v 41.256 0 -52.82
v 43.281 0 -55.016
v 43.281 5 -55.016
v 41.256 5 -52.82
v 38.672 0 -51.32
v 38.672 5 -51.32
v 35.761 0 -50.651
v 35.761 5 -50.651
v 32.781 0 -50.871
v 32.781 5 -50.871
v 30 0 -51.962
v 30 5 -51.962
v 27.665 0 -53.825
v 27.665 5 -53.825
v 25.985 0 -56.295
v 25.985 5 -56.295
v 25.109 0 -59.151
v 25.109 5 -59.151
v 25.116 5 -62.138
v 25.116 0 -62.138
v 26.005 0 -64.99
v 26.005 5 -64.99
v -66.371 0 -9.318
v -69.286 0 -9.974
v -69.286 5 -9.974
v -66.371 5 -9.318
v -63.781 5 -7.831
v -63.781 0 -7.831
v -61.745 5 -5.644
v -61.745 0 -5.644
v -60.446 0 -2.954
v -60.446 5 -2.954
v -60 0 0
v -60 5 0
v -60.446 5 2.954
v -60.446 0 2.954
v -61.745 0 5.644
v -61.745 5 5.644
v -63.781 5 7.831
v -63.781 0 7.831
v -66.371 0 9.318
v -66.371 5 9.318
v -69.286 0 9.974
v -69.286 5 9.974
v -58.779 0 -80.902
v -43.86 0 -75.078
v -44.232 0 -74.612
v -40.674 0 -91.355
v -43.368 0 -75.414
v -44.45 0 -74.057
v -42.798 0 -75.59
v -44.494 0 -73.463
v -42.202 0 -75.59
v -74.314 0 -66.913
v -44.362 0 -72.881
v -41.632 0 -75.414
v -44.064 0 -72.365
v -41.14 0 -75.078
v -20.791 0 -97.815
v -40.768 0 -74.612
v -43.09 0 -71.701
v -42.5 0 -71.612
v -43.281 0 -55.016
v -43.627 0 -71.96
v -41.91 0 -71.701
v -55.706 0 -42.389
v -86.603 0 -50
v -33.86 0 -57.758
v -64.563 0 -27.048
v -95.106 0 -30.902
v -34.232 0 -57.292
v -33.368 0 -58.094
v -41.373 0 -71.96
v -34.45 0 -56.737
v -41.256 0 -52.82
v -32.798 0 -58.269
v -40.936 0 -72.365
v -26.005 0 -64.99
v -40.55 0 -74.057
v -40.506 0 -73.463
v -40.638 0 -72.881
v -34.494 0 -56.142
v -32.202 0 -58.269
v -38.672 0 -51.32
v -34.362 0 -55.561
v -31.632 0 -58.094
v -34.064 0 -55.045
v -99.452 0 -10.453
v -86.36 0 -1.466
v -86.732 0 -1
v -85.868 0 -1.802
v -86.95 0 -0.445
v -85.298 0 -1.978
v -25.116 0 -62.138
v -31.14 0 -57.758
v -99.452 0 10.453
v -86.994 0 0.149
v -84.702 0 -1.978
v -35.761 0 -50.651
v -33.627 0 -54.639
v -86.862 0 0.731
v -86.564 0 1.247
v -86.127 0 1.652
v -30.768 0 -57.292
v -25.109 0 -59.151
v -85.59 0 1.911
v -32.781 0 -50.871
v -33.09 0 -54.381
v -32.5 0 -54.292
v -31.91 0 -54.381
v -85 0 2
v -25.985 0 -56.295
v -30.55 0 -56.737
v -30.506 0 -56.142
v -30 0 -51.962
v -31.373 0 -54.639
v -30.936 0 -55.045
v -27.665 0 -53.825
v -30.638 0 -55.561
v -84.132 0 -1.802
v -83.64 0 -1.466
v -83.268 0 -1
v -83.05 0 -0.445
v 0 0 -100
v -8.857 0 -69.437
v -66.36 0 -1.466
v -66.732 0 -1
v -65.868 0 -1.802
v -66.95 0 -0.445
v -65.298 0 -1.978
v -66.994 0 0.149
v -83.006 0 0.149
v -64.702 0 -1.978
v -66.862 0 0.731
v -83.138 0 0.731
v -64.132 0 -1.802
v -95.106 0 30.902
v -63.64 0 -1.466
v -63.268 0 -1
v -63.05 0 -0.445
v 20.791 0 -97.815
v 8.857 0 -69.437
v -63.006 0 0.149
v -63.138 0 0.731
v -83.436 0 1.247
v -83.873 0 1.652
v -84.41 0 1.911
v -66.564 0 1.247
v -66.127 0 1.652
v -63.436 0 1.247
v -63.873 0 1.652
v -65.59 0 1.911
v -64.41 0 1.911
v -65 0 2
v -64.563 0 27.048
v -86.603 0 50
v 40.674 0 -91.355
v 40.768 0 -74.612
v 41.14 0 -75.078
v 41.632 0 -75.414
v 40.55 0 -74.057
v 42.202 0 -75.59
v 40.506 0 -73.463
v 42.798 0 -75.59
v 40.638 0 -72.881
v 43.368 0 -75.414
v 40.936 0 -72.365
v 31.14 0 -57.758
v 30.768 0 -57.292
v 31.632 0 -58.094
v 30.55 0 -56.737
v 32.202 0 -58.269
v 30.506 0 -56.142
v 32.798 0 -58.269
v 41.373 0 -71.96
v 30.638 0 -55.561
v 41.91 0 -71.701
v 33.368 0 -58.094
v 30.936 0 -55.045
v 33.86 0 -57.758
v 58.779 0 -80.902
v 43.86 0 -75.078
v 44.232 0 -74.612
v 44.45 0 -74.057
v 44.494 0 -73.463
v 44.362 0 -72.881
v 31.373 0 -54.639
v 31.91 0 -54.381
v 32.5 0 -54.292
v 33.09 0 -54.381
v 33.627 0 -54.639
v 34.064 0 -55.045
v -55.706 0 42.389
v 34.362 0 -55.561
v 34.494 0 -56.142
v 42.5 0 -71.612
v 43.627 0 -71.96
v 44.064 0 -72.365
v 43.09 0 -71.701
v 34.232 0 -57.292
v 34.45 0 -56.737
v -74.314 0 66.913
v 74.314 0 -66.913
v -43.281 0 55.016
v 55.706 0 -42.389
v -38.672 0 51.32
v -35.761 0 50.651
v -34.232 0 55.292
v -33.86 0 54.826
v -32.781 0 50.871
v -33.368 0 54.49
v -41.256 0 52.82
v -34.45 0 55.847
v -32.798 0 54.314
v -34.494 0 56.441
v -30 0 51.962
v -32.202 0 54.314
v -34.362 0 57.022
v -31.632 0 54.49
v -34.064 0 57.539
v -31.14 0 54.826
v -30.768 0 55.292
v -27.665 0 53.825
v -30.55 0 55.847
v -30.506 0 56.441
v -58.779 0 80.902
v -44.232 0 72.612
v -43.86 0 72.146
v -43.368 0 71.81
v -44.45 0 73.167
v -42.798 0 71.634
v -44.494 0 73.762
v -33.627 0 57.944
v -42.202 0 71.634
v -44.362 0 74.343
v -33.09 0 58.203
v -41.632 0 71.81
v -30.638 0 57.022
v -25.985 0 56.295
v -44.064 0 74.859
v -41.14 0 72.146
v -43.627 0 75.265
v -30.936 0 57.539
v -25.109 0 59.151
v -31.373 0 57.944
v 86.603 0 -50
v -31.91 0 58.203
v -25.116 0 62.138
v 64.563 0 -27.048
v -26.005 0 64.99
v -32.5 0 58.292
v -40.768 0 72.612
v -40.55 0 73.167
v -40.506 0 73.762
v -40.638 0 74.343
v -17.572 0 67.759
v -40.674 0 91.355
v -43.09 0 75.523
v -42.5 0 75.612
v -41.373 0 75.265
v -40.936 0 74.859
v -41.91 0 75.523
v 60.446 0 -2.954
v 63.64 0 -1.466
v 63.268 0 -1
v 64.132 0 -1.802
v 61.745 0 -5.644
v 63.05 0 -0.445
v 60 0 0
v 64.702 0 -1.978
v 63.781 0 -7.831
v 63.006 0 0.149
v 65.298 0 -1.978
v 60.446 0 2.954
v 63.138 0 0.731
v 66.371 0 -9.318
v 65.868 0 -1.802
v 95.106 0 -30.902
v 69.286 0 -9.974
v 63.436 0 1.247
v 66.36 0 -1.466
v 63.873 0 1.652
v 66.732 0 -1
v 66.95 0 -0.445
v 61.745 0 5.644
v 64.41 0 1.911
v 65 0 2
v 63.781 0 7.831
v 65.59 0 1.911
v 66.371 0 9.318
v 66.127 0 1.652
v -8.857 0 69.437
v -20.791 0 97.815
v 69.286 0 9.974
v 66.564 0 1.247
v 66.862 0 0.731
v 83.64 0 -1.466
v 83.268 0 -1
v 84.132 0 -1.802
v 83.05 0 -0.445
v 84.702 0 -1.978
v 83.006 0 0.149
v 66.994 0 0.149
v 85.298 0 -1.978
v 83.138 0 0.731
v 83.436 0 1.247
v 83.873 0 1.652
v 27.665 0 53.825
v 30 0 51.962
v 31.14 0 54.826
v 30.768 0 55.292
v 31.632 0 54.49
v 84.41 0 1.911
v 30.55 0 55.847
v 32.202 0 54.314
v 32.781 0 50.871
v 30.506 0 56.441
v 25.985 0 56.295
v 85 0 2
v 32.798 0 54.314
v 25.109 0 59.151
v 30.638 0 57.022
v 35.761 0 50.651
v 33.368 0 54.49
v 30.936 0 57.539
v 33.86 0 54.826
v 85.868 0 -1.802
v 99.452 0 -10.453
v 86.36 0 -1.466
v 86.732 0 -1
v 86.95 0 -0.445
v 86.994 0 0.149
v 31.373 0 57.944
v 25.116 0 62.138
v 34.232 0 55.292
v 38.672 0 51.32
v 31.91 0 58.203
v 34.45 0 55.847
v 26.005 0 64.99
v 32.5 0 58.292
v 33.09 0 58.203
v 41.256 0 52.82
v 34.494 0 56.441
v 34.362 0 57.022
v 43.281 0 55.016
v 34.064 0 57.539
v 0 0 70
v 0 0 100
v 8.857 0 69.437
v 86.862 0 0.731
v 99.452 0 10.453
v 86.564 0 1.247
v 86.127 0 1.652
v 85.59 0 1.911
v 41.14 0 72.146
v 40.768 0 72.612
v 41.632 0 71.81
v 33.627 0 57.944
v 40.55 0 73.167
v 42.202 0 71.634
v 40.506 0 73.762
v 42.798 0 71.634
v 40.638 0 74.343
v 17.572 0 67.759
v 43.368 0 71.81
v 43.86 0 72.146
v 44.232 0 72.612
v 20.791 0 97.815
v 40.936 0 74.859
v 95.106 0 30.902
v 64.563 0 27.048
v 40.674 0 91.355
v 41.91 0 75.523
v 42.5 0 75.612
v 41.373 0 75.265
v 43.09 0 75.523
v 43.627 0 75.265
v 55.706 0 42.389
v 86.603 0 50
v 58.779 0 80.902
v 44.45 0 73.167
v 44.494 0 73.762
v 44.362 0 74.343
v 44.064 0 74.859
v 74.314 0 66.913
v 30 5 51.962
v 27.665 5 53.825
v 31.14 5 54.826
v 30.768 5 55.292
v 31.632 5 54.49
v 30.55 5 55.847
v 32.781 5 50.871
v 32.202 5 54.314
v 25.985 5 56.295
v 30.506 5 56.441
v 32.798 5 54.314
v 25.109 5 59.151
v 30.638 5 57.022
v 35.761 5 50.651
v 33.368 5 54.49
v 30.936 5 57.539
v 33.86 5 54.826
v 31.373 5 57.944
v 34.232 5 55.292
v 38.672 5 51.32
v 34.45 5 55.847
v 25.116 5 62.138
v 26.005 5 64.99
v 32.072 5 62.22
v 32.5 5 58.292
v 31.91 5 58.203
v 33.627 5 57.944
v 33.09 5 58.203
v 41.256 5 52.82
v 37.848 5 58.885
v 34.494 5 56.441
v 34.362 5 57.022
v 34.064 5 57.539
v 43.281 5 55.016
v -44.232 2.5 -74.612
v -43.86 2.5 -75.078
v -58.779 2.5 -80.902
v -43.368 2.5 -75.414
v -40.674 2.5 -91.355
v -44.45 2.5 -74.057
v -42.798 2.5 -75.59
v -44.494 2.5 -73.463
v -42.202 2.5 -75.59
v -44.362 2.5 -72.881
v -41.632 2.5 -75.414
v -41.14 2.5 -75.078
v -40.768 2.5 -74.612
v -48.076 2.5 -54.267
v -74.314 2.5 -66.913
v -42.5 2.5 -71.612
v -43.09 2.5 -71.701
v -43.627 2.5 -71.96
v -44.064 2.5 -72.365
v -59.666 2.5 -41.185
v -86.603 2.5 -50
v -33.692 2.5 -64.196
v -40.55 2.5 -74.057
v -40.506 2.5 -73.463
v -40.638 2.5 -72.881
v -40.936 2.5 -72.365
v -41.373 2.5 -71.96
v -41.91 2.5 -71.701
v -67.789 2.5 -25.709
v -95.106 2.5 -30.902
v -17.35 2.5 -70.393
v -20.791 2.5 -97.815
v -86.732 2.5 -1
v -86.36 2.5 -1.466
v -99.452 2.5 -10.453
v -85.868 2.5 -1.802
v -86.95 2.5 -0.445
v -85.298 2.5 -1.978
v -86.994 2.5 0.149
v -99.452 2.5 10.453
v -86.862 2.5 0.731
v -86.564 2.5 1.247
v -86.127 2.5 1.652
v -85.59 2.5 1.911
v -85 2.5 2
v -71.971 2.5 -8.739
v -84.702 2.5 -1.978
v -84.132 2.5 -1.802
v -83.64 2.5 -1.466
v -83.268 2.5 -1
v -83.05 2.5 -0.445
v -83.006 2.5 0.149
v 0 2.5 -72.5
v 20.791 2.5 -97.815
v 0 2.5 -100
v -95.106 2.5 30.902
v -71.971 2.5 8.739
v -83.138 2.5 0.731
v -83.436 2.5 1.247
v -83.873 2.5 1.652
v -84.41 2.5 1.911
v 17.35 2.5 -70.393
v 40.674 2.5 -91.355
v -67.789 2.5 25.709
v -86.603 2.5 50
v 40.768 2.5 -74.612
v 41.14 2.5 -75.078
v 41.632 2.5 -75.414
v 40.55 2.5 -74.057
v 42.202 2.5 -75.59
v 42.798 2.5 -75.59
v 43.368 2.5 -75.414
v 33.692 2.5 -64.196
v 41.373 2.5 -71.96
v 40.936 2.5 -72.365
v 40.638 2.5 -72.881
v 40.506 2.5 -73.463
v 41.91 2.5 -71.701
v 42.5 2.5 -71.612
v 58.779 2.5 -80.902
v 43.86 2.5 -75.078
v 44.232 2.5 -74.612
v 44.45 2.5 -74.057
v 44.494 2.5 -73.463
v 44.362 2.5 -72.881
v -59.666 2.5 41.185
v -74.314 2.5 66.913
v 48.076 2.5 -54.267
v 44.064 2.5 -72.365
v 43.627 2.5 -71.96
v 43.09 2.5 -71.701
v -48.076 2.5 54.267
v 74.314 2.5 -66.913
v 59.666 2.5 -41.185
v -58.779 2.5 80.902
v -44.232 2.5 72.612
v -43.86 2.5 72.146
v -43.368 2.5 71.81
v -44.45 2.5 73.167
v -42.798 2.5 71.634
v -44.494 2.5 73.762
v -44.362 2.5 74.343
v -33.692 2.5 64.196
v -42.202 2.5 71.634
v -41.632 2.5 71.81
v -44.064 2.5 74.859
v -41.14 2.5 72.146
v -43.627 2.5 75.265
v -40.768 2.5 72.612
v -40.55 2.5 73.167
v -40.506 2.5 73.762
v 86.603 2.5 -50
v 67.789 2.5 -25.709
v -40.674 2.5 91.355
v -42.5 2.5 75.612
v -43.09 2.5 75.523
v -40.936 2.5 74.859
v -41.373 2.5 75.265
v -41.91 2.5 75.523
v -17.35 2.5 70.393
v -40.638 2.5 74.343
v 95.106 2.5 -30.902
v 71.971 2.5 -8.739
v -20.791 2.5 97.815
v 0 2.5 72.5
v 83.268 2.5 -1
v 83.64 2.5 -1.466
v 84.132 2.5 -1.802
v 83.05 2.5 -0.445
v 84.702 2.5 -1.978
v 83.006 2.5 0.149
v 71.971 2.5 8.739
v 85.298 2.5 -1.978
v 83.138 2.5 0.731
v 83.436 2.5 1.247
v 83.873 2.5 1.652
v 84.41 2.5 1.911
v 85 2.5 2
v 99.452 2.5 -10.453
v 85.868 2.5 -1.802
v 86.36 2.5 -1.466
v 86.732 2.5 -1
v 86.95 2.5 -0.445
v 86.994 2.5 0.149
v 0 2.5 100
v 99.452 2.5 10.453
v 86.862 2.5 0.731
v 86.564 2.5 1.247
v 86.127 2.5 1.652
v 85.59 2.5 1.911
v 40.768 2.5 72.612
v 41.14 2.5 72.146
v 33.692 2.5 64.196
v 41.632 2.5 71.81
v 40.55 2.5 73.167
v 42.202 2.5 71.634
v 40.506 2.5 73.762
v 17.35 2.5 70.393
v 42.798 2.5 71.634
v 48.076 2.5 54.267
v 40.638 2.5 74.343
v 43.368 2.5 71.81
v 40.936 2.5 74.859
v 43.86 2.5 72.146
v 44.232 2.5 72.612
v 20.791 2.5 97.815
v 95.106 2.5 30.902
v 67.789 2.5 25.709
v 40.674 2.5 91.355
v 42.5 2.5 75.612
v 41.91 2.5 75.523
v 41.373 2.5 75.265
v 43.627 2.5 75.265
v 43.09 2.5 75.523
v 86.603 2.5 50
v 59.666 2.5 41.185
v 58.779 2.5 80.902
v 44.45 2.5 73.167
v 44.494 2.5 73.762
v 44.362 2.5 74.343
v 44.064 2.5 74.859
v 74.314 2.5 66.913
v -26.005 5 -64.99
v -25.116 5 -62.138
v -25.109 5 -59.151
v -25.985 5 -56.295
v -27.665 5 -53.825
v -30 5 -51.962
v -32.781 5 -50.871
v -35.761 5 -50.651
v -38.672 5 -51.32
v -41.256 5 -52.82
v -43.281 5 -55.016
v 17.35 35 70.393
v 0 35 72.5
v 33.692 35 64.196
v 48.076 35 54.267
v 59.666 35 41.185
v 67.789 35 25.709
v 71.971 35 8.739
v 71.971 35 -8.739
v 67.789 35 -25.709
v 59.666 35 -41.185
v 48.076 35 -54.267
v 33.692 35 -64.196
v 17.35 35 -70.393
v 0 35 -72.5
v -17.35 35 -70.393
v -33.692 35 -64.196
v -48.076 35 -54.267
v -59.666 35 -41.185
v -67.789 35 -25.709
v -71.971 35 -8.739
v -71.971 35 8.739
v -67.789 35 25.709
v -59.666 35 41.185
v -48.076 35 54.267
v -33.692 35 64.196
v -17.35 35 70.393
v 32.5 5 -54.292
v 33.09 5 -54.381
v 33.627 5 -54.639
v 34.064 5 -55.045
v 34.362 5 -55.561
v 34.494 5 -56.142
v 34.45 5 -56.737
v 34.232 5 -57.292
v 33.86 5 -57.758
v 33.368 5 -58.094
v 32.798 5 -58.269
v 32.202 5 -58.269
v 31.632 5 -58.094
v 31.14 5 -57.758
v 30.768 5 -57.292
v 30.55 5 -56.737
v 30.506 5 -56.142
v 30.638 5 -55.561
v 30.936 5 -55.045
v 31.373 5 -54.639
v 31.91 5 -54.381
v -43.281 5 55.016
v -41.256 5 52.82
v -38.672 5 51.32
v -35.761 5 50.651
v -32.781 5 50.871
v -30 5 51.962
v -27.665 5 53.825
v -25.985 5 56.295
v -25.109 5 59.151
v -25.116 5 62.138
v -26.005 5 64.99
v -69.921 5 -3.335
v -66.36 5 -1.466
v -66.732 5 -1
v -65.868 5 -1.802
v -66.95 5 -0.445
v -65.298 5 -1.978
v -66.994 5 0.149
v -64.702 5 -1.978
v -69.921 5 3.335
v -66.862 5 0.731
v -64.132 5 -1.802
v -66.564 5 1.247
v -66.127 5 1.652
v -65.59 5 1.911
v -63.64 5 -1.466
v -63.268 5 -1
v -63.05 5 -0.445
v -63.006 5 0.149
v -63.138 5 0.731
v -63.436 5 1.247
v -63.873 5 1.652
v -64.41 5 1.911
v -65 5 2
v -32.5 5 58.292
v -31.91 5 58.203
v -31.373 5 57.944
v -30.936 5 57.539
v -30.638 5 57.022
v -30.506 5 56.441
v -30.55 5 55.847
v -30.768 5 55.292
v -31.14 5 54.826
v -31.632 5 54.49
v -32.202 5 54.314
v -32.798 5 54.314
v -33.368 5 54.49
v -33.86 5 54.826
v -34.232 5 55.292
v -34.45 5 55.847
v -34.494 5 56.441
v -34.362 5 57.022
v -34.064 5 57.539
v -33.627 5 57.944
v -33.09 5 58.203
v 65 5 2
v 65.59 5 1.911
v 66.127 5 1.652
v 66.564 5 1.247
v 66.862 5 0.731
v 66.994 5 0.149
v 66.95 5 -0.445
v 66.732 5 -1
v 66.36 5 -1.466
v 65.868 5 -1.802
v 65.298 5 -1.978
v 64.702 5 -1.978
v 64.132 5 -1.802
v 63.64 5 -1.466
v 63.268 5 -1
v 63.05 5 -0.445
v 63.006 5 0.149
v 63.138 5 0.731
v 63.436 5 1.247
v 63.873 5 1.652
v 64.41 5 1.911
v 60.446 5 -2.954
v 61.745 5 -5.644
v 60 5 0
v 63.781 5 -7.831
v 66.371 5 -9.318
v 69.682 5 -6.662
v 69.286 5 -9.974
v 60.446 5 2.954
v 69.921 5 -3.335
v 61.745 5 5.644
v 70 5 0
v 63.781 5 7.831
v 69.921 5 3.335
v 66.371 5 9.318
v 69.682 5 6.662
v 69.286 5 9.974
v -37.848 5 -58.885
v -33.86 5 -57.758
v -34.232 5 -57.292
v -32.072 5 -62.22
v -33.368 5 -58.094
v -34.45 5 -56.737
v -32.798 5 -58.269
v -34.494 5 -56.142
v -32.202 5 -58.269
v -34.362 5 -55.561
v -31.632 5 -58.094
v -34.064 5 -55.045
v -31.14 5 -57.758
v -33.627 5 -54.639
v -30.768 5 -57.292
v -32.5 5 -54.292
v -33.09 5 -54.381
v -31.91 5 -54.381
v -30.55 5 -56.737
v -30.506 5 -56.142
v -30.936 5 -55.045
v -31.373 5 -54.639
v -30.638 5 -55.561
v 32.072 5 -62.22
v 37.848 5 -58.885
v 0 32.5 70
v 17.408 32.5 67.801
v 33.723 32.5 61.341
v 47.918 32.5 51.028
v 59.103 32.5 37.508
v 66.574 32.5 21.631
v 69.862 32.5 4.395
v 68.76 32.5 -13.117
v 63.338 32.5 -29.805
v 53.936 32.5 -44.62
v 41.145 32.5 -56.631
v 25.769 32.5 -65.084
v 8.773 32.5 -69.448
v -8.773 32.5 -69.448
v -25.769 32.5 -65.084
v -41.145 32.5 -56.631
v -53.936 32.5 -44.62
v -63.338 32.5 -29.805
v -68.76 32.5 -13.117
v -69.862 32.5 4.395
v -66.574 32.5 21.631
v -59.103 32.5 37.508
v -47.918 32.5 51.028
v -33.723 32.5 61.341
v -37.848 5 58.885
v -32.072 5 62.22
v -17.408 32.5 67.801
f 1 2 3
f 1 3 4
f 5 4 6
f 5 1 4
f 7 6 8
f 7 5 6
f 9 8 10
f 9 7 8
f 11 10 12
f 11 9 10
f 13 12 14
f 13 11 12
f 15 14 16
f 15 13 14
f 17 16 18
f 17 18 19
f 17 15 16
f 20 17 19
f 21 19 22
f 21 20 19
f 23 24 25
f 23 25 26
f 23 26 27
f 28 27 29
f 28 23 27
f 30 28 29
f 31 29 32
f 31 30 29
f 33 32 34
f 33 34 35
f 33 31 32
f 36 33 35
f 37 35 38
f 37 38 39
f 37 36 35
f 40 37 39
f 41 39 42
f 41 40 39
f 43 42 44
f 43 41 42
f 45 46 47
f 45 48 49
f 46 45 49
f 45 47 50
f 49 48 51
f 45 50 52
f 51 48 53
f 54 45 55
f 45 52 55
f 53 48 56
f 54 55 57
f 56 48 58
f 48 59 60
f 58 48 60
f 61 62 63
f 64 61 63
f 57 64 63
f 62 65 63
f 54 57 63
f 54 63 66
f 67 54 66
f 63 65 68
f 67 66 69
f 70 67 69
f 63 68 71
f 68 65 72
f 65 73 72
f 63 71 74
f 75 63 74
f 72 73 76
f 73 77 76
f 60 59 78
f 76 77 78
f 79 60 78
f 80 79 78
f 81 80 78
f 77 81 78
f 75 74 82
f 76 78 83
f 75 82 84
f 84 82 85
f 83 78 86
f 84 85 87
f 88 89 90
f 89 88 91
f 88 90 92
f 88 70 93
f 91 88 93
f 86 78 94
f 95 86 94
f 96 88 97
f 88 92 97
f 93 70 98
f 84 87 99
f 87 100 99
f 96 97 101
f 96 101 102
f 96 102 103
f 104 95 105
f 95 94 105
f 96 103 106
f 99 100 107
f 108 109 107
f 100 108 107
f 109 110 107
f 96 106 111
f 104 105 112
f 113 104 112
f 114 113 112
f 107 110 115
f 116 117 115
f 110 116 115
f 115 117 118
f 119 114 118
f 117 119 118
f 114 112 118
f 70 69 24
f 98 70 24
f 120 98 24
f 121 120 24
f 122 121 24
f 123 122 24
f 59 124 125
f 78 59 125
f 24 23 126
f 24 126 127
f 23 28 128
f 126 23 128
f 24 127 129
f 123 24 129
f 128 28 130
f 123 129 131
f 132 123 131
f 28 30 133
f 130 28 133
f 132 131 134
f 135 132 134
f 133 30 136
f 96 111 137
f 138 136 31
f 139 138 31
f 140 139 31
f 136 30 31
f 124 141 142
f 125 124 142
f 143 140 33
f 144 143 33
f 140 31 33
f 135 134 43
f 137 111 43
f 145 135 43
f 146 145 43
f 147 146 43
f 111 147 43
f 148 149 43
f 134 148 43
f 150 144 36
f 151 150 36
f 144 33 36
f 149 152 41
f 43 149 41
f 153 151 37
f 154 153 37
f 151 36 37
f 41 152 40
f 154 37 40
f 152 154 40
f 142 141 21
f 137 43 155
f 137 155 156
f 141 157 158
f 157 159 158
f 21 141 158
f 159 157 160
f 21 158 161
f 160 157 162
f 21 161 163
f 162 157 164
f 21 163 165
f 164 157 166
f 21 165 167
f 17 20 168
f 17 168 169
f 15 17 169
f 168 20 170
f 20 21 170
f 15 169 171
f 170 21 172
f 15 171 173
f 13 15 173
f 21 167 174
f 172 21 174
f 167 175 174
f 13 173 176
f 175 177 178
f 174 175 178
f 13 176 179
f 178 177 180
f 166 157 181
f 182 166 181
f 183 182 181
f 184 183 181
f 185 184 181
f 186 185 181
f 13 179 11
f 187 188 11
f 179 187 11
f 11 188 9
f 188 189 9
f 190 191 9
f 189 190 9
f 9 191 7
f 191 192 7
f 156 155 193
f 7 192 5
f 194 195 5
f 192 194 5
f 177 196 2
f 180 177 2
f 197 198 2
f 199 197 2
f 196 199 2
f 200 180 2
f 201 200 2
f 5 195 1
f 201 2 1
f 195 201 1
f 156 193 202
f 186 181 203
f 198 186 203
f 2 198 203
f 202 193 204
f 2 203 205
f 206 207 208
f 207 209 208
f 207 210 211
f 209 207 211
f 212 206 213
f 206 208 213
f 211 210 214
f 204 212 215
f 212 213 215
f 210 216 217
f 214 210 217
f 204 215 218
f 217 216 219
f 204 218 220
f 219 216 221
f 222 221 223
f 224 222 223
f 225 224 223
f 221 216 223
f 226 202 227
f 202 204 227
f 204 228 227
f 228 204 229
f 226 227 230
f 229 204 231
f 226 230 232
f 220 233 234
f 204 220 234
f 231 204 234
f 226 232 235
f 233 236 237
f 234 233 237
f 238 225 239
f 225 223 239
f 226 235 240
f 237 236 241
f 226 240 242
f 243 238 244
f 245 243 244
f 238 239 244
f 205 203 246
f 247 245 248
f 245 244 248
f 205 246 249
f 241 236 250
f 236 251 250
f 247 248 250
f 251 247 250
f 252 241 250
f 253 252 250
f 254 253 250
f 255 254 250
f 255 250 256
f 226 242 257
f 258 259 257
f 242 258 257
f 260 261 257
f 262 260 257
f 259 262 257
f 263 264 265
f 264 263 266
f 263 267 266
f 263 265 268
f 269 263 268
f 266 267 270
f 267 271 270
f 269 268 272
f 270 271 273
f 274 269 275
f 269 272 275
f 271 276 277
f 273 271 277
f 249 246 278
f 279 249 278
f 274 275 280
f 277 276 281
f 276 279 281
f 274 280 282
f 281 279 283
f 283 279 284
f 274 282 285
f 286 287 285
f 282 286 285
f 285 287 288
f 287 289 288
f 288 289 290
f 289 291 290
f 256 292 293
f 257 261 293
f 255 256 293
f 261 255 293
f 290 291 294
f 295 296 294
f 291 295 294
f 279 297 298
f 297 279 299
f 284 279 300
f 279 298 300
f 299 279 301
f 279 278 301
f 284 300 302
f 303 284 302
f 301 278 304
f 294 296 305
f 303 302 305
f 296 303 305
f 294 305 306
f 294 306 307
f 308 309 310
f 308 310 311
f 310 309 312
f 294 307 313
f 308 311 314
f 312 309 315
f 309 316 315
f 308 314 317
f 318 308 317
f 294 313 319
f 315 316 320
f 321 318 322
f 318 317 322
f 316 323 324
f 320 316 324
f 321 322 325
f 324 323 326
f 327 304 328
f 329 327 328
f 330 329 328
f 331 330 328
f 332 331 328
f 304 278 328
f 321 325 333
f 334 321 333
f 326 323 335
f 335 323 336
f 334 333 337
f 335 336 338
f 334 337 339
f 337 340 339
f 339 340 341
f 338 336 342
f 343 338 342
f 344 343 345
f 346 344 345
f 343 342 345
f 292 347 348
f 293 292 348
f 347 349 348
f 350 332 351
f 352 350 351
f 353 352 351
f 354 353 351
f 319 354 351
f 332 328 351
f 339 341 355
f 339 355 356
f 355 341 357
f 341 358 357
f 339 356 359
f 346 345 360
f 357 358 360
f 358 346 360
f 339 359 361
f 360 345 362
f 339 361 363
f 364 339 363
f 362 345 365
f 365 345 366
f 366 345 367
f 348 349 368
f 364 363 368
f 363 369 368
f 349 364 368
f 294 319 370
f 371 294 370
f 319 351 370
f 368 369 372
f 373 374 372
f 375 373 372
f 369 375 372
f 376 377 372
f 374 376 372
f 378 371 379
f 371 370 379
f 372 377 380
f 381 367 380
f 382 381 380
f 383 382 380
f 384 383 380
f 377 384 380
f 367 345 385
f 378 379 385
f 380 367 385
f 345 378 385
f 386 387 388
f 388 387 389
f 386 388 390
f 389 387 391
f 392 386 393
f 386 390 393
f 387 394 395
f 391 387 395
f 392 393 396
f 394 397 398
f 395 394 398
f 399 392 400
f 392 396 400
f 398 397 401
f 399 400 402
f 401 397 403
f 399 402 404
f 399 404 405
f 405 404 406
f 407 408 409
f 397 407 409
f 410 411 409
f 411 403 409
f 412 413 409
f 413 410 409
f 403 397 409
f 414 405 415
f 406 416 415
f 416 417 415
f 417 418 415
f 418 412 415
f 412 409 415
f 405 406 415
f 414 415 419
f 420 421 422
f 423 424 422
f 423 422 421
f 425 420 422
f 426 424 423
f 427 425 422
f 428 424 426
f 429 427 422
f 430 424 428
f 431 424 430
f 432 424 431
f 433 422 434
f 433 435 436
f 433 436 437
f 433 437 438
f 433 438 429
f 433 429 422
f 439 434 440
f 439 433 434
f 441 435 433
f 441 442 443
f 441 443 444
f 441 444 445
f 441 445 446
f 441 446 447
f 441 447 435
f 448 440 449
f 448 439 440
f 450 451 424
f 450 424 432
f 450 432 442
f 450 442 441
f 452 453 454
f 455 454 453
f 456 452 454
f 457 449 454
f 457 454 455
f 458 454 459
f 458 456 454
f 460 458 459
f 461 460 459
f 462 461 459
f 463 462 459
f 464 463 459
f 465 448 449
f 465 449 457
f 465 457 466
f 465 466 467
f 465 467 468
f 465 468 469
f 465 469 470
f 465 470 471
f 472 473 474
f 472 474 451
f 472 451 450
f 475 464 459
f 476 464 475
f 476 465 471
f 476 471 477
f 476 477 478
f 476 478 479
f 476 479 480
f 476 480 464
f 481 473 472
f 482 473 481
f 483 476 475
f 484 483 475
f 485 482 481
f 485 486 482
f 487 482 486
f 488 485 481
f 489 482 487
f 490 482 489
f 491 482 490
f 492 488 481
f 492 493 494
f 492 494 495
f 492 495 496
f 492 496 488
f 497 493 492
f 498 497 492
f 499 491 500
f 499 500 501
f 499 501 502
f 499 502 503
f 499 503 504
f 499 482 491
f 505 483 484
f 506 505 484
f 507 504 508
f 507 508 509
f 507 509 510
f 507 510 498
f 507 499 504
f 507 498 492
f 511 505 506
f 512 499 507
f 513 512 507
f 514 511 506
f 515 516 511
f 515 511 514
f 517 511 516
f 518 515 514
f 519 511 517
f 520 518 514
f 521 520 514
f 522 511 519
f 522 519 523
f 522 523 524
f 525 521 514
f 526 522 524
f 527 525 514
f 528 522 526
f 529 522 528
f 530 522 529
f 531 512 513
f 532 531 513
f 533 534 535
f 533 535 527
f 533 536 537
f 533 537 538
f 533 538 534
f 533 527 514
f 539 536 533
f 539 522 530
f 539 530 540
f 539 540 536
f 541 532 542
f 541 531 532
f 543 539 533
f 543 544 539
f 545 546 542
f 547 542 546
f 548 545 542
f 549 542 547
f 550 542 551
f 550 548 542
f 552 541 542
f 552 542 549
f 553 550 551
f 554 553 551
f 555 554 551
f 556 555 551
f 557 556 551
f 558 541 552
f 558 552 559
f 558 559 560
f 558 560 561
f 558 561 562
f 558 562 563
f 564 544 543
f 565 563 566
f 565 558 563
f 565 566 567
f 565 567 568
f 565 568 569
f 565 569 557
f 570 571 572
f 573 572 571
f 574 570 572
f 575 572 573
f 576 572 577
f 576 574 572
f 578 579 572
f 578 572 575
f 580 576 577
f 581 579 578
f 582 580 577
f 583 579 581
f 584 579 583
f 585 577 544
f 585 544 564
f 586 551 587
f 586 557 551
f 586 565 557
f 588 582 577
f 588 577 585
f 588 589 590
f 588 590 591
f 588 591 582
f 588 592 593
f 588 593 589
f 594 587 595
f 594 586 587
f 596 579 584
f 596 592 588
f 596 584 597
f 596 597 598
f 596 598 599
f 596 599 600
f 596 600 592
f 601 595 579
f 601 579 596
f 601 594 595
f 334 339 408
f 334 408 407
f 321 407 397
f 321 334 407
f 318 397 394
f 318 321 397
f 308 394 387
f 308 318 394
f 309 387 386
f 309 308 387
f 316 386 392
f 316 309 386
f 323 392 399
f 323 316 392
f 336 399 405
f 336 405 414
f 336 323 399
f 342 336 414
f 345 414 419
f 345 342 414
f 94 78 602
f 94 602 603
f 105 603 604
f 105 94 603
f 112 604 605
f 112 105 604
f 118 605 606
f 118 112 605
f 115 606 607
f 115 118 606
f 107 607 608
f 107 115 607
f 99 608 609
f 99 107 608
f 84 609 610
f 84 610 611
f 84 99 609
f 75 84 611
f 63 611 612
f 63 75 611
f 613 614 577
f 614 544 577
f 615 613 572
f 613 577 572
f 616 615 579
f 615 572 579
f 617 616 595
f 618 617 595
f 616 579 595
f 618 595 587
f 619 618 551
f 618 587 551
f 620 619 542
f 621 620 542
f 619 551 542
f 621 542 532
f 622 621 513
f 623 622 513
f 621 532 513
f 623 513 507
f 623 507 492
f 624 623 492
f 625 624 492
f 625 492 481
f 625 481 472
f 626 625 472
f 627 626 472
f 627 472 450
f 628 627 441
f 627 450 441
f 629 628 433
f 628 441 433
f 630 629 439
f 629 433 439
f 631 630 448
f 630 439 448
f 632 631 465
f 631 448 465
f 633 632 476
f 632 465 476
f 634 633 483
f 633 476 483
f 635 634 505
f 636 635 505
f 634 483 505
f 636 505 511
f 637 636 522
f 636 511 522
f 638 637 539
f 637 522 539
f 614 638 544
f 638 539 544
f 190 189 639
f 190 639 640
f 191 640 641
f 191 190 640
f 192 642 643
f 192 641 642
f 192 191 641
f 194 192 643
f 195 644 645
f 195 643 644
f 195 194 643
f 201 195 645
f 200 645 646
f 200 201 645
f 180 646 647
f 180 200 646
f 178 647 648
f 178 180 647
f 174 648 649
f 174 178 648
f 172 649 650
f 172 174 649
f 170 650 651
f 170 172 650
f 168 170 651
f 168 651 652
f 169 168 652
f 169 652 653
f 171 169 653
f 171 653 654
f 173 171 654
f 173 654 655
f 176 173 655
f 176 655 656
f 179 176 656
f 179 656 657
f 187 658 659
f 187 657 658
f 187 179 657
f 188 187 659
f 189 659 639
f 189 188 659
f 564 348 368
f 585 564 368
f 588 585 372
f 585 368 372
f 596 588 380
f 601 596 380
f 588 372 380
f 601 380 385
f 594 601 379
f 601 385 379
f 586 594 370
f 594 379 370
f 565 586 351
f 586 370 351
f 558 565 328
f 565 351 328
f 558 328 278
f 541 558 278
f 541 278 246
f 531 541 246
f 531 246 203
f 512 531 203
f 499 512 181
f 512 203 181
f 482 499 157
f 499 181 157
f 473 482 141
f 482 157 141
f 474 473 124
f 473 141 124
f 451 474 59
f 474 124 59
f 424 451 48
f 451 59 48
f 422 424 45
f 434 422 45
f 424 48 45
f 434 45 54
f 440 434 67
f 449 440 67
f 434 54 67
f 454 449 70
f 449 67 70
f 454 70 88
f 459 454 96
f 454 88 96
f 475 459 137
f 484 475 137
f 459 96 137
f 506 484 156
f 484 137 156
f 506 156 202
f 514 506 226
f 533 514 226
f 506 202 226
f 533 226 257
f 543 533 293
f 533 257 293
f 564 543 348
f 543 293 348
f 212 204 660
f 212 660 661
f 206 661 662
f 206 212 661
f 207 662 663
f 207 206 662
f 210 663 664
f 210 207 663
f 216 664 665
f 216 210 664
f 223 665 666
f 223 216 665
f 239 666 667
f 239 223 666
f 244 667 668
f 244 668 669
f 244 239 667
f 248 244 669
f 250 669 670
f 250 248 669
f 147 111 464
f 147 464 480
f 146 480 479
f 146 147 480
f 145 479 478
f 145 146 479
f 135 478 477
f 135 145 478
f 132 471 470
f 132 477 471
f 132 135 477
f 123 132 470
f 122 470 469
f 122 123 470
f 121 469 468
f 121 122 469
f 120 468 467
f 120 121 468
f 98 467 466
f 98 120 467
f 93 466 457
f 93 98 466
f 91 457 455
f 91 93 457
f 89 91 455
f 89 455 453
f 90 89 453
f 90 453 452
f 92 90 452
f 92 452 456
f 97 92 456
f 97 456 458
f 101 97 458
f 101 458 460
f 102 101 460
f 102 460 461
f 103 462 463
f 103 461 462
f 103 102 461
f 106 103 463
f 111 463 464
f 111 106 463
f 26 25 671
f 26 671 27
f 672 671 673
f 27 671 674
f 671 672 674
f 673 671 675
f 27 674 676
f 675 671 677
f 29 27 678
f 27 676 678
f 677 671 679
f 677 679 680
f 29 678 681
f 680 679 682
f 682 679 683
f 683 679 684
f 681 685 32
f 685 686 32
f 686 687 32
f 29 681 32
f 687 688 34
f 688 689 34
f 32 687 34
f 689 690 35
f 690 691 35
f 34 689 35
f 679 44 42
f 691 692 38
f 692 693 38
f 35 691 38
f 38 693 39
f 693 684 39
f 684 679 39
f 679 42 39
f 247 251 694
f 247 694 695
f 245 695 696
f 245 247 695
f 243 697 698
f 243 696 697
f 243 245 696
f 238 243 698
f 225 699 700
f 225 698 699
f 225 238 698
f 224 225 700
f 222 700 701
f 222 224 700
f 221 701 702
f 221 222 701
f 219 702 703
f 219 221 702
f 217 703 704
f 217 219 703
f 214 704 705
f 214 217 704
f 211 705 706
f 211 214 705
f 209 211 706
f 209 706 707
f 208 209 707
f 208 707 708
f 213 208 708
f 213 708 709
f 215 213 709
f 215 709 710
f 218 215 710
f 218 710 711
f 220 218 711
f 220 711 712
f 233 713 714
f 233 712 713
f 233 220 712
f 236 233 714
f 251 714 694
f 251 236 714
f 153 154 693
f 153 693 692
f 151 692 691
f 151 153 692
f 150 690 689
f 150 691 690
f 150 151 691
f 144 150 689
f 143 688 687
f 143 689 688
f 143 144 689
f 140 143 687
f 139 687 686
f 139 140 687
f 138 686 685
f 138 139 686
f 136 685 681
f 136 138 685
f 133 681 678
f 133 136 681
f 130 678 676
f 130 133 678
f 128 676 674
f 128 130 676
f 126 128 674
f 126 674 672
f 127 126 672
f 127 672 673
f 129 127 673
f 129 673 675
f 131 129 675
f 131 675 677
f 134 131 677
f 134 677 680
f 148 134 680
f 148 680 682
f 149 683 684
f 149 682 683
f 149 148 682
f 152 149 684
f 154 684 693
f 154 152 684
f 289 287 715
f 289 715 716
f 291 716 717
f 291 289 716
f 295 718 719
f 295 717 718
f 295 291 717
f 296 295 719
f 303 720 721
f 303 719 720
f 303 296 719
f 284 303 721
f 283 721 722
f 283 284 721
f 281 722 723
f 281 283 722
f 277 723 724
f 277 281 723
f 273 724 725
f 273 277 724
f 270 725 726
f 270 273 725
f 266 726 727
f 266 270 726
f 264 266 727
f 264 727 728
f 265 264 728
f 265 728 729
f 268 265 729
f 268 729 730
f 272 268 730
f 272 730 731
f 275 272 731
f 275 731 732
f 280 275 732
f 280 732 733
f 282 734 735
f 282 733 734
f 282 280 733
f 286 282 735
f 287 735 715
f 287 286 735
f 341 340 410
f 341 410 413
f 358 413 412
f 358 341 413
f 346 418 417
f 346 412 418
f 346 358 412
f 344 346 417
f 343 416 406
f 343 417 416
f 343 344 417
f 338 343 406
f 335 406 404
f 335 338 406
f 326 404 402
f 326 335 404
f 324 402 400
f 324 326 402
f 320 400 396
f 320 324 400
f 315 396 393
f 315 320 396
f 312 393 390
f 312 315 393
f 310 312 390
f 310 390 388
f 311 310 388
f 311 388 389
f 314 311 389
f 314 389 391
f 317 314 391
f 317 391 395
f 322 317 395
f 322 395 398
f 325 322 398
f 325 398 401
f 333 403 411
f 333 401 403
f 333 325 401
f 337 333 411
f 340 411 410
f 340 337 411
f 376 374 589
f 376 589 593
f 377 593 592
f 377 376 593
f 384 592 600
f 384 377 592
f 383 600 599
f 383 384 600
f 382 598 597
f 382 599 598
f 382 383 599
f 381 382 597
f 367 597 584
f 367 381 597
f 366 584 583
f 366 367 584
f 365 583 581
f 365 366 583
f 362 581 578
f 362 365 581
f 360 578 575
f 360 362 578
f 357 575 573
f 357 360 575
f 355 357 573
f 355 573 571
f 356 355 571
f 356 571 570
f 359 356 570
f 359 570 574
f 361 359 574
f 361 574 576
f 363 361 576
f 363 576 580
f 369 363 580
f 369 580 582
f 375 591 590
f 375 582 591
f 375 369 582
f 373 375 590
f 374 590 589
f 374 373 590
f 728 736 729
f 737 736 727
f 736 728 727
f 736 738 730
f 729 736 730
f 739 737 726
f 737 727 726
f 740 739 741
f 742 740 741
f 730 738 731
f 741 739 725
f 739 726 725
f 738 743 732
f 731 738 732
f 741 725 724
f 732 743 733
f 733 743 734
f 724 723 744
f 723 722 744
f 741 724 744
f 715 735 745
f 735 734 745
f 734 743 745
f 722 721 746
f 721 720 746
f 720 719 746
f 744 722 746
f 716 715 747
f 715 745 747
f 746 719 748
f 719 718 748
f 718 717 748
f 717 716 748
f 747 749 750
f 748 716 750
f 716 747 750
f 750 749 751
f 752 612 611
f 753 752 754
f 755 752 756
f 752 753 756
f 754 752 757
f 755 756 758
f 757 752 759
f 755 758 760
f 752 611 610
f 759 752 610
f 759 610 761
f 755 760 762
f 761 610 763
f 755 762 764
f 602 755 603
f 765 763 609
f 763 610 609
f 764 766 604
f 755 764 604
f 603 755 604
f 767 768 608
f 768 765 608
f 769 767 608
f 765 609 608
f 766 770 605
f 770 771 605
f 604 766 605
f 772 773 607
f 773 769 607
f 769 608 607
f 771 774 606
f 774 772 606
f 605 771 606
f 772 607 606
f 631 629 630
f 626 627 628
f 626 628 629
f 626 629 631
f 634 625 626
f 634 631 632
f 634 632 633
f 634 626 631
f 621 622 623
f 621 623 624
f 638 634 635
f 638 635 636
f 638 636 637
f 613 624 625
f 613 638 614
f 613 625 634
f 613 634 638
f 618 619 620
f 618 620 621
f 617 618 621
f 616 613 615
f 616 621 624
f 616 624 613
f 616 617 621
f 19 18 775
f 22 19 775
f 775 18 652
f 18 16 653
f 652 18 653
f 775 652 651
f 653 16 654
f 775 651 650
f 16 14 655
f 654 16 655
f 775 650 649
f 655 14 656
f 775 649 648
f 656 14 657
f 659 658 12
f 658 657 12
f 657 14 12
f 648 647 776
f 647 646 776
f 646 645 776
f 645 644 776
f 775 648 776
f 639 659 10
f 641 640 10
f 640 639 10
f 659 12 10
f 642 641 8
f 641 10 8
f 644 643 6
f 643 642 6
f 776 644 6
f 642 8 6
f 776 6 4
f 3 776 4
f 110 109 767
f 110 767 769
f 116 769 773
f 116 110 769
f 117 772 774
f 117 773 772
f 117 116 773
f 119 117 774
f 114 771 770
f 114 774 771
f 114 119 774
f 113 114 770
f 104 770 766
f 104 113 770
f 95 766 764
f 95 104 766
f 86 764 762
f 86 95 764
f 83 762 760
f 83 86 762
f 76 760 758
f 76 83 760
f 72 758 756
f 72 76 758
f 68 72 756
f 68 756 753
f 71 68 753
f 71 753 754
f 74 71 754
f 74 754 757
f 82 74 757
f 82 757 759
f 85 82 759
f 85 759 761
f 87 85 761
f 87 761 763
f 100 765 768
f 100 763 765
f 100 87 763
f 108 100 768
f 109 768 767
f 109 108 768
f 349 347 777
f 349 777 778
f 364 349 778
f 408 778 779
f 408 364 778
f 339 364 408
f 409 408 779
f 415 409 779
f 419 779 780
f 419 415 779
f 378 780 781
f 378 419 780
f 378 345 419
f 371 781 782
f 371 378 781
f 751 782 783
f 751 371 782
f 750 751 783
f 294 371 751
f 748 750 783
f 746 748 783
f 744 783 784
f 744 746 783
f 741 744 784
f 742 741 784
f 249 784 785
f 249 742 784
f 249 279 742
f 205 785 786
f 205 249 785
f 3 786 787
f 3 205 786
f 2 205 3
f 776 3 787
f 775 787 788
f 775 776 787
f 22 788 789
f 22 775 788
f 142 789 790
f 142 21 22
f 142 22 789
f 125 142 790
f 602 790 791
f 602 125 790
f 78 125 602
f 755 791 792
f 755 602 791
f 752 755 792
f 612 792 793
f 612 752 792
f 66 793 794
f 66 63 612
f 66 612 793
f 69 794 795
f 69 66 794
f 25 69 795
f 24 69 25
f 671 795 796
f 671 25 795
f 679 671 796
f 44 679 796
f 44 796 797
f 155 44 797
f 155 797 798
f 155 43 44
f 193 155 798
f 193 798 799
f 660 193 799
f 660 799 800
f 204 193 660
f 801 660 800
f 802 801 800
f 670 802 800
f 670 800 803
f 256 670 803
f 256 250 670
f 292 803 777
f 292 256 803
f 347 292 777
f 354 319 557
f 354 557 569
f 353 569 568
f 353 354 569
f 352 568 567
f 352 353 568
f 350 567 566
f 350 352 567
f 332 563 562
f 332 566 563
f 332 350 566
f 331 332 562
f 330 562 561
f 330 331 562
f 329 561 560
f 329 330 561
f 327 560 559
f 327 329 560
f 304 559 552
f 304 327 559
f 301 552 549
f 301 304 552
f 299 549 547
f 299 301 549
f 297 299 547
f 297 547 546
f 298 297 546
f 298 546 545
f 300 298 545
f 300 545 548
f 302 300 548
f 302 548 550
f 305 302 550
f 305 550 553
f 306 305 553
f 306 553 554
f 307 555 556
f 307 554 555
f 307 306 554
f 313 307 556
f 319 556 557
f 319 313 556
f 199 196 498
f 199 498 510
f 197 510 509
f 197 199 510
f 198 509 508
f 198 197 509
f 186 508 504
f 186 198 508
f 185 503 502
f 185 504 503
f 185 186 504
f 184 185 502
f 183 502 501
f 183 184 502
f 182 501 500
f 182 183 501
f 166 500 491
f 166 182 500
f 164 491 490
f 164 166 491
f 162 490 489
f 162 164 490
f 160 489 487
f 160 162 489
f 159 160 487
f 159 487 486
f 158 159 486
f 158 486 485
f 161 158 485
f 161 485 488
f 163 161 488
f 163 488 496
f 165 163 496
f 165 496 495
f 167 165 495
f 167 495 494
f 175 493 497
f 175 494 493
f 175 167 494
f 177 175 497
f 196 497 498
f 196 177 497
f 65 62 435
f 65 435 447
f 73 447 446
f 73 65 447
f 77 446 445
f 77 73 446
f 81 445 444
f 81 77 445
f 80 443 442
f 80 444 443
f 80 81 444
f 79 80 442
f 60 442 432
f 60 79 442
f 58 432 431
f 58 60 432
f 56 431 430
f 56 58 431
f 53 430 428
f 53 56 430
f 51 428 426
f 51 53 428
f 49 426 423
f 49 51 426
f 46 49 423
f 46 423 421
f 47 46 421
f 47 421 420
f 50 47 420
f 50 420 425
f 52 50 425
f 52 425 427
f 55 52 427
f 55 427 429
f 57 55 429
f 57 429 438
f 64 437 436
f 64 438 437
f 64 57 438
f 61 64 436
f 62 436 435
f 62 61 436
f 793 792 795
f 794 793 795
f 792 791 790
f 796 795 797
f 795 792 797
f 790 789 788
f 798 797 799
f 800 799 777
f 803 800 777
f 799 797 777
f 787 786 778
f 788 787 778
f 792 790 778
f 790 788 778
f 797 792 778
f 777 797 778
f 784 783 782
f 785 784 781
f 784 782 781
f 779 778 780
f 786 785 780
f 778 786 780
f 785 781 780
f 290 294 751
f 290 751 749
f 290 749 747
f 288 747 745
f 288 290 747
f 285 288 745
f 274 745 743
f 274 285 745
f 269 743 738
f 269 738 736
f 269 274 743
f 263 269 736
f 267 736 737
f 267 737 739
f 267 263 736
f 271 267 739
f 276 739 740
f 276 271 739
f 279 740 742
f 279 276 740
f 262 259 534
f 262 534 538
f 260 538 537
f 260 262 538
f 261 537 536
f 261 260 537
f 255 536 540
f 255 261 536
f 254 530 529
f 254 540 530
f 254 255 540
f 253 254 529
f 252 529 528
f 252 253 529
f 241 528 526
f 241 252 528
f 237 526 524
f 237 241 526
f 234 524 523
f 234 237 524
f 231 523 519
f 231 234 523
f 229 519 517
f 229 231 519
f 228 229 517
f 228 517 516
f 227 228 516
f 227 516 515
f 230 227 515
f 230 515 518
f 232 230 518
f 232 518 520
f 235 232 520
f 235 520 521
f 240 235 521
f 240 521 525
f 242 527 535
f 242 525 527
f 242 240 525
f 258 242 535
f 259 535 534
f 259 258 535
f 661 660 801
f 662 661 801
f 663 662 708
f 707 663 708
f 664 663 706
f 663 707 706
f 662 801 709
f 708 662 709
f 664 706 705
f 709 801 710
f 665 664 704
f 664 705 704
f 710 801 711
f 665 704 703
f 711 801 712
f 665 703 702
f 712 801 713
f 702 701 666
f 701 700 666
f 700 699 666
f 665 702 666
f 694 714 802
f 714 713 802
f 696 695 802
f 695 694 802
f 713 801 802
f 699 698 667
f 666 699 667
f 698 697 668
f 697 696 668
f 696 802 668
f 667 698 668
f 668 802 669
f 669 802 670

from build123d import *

# Parameters (mm, degrees)
SKETCH1_R               = 100
SKETCH1_R_2             = 70
BOSS_EXTRUDE1_DEPTH     = 2.5
SKETCH2_R               = 72.5
SKETCH2_R_2             = 70
BOSS_EXTRUDE2_DEPTH     = 30
SKETCH3_R               = 72.5
BOSS_EXTRUDE3_DEPTH     = 2.5
BOSS_EXTRUDE4_DEPTH     = 5
CUT_EXTRUDE1_DEPTH      = 5
CUT_EXTRUDE1_DEPTH_BACK = 146.107718609
SKETCH4_R               = 2


with BuildPart() as part:
    # Sketch1 → Boss-Extrude1 (new body)
    with BuildSketch(Plane(origin=(0, 0, 0), x_dir=(1, 0, 0), z_dir=(0, 1, 0))):
        with Locations(Location((0, 0, 0), (0, 0, 270))):
            Circle(SKETCH1_R)
        with Locations(Location((0, 0, 0), (0, 0, 270))):
            Circle(SKETCH1_R_2, mode=Mode.SUBTRACT)
    extrude(amount=BOSS_EXTRUDE1_DEPTH)

    # Sketch2 → Boss-Extrude2 (add)
    with BuildSketch(Plane(origin=(0, 2.5, 0), x_dir=(1, 0, 0), z_dir=(0, 1, 0))):
        with Locations(Location((0, 0, 0), (0, 0, 270))):
            Circle(SKETCH2_R)
        with Locations(Location((0, 0, 0), (0, 0, 270))):
            Circle(SKETCH2_R_2, mode=Mode.SUBTRACT)
    extrude(amount=BOSS_EXTRUDE2_DEPTH)

    # Sketch3 → Boss-Extrude3 (add)
    with BuildSketch(Plane(origin=(0, 32.5, 0), x_dir=(1, 0, 0), z_dir=(0, 1, 0))):
        with Locations(Location((0, 0, 0), (0, 0, 270))):
            Circle(SKETCH3_R)
    extrude(amount=BOSS_EXTRUDE3_DEPTH)

    # Sketch5 → Boss-Extrude4 (add)
    with BuildSketch(Plane.XZ):
        with BuildLine():
            ThreePointArc((69.285714286, -9.974457174), (69.821200219, -5), (70, 0))
            ThreePointArc((70, 0), (69.821200219, 5), (69.285714286, 9.974457174))
            ThreePointArc((69.285714286, 9.974457174), (60, 0), (69.285714286, -9.974457174))
        make_face()
        with BuildLine():
            ThreePointArc((26.004723841, 64.990417278), (30, 51.961524227), (43.280990445, 55.015960104))
            ThreePointArc((43.280990445, 55.015960104), (35, 60.621778265), (26.004723841, 64.990417278))
        make_face()
        with BuildLine():
            ThreePointArc((-43.280990445, 55.015960104), (-30, 51.961524227), (-26.004723841, 64.990417278))
            ThreePointArc((-26.004723841, 64.990417278), (-35, 60.621778265), (-43.280990445, 55.015960104))
        make_face()
        with BuildLine():
            ThreePointArc((-69.285714286, -9.974457174), (-60, 0), (-69.285714286, 9.974457174))
            ThreePointArc((-69.285714286, 9.974457174), (-70, 0), (-69.285714286, -9.974457174))
        make_face()
        with BuildLine():
            ThreePointArc((-43.280990445, -55.015960104), (-35, -60.621778265), (-26.004723841, -64.990417278))
            ThreePointArc((-26.004723841, -64.990417278), (-30, -51.961524227), (-43.280990445, -55.015960104))
        make_face()
        with BuildLine():
            ThreePointArc((26.004723841, -64.990417278), (35, -60.621778265), (43.280990445, -55.015960104))
            ThreePointArc((43.280990445, -55.015960104), (30, -51.961524227), (26.004723841, -64.990417278))
        make_face()
    extrude(amount=-BOSS_EXTRUDE4_DEPTH)

    # Sketch4 → Cut-Extrude1 (cut, two sides: drawn at the far end of the back side and taken through both)
    with BuildSketch(Plane(origin=(0, 2.5, 0), x_dir=(1, 0, 0), z_dir=(0, 1, 0)).offset(-CUT_EXTRUDE1_DEPTH_BACK)):
        with Locations(Location((85, 0, 0), (0, 0, 270))):
            Circle(SKETCH4_R)
        with Locations(Location((65, 0, 0), (0, 0, 270))):
            Circle(SKETCH4_R)
        with Locations(Location((32.5, -56.291651246, 0), (0, 0, 270))):
            Circle(SKETCH4_R)
        with Locations(Location((42.5, -73.612159322, 0), (0, 0, 270))):
            Circle(SKETCH4_R)
        with Locations(Location((-32.5, -56.291651246, 0), (0, 0, 270))):
            Circle(SKETCH4_R)
        with Locations(Location((-42.5, -73.612159322, 0), (0, 0, 270))):
            Circle(SKETCH4_R)
        with Locations(Location((-65, 0, 0), (0, 0, 270))):
            Circle(SKETCH4_R)
        with Locations(Location((-85, 0, 0), (0, 0, 270))):
            Circle(SKETCH4_R)
        with Locations(Location((-32.5, 56.291651246, 0), (0, 0, 270))):
            Circle(SKETCH4_R)
        with Locations(Location((-42.5, 73.612159322, 0), (0, 0, 270))):
            Circle(SKETCH4_R)
        with Locations(Location((32.5, 56.291651246, 0), (0, 0, 270))):
            Circle(SKETCH4_R)
        with Locations(Location((42.5, 73.612159322, 0), (0, 0, 270))):
            Circle(SKETCH4_R)
    extrude(amount=CUT_EXTRUDE1_DEPTH + CUT_EXTRUDE1_DEPTH_BACK, mode=Mode.SUBTRACT)


solid = part.part
